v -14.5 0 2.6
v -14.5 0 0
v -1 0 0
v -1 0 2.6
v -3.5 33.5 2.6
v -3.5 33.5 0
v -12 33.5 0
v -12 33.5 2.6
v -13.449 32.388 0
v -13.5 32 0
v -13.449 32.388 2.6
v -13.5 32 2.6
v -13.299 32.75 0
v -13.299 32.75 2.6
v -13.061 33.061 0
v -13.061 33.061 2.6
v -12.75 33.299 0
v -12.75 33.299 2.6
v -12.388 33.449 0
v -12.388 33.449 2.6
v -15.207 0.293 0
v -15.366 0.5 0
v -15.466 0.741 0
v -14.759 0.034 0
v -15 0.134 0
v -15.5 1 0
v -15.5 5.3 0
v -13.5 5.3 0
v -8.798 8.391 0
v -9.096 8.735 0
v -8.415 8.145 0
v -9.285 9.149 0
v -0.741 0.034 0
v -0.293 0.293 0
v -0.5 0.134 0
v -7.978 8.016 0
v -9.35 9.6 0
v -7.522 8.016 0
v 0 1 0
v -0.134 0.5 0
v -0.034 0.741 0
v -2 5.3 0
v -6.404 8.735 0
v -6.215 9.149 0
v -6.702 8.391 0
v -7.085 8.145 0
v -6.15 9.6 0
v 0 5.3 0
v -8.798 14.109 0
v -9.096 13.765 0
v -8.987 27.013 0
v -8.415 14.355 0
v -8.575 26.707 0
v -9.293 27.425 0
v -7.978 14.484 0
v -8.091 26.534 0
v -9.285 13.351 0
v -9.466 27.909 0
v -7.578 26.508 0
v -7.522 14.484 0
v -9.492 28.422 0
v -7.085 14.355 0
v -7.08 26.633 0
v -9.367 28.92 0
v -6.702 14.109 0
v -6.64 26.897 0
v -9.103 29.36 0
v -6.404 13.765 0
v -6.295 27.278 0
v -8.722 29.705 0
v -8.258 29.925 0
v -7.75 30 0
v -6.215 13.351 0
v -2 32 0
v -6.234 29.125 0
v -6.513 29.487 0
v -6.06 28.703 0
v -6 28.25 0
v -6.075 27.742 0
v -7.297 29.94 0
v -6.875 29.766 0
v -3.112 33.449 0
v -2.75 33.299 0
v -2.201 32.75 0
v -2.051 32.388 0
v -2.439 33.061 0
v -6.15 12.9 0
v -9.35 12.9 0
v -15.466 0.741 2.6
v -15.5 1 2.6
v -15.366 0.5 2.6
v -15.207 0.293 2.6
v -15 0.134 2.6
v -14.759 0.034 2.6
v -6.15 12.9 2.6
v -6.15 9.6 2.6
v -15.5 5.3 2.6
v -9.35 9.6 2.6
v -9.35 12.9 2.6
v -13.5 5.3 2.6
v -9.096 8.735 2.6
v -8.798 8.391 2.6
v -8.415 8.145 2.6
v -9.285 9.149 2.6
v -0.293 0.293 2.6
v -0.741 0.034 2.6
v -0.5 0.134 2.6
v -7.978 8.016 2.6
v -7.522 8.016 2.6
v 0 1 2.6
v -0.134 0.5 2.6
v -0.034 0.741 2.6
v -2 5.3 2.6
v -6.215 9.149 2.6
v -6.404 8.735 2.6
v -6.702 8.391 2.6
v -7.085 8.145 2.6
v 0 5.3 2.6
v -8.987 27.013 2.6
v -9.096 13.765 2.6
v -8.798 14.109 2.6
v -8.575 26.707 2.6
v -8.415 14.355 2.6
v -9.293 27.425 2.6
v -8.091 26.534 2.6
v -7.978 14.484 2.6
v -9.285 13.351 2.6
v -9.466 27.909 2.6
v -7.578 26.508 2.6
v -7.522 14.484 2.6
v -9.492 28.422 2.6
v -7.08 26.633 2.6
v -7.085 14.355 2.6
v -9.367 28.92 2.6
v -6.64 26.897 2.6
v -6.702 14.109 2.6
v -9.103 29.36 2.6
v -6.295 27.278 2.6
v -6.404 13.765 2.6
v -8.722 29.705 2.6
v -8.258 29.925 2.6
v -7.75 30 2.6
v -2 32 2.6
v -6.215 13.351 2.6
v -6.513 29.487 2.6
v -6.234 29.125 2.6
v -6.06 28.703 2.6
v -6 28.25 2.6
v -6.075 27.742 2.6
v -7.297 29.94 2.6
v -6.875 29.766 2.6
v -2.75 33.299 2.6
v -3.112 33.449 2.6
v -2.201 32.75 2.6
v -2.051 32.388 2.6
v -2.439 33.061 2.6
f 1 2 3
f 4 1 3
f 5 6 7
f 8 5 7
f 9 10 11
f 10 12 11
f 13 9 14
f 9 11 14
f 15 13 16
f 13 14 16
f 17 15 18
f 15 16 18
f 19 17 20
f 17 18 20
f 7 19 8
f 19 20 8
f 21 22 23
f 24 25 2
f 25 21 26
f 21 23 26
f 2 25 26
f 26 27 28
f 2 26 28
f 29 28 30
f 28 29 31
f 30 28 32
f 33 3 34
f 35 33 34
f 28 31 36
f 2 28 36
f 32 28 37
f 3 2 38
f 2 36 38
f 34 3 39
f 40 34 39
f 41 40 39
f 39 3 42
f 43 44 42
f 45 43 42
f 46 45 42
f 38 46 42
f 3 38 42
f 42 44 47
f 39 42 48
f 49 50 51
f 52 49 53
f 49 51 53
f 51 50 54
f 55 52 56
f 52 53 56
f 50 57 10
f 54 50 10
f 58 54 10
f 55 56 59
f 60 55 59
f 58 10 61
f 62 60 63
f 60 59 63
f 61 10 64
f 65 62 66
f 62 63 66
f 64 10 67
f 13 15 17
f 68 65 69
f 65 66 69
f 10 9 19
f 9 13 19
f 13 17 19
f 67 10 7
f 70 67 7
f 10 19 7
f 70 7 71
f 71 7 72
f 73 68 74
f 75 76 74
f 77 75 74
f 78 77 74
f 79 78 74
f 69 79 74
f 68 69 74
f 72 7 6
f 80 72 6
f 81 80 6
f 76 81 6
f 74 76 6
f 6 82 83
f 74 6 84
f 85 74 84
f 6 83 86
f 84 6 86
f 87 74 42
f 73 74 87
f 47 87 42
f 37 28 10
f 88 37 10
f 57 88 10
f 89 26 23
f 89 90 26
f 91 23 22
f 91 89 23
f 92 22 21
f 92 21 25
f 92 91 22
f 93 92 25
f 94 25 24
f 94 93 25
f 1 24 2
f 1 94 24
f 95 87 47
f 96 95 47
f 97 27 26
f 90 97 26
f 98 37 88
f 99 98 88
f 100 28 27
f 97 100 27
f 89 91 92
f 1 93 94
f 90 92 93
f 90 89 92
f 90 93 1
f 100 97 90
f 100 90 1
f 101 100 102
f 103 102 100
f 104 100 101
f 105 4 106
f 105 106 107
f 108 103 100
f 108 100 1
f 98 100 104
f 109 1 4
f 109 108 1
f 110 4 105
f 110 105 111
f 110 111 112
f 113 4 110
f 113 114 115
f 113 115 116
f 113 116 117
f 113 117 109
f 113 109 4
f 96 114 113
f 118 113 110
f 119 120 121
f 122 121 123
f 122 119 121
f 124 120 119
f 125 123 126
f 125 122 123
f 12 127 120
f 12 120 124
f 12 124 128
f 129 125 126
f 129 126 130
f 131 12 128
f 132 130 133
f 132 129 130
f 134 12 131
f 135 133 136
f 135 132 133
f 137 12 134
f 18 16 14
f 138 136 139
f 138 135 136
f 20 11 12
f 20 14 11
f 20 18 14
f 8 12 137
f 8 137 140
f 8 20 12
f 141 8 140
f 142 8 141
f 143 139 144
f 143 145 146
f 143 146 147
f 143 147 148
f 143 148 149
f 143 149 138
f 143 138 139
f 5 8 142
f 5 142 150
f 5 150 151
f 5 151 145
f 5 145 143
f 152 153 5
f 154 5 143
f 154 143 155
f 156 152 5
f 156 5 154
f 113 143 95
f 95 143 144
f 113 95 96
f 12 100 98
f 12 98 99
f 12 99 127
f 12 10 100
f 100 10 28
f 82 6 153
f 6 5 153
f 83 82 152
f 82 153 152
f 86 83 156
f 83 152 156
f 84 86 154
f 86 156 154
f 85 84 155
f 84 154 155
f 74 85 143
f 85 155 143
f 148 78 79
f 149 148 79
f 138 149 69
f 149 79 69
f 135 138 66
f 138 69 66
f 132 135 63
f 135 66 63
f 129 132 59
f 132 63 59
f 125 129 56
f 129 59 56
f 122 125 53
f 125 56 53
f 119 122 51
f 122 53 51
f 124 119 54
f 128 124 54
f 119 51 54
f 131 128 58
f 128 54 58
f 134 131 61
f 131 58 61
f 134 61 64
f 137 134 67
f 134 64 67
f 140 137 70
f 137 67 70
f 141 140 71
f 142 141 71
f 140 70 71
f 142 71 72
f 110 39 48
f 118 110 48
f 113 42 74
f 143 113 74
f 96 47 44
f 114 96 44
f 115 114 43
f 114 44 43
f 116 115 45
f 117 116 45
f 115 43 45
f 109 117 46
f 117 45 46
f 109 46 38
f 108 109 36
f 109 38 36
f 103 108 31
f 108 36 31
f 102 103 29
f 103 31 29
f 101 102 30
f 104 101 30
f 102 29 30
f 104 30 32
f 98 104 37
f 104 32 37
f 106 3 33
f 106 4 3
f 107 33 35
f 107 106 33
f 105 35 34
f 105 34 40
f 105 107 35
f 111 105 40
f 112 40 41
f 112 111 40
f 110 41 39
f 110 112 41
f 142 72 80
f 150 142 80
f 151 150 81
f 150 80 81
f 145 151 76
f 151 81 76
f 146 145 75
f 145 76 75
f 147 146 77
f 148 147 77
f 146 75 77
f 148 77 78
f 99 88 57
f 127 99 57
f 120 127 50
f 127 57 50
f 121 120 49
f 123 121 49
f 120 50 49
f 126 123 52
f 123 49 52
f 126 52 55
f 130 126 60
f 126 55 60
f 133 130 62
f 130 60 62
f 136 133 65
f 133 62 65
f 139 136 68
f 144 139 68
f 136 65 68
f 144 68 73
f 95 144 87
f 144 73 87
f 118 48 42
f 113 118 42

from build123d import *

# Parameters (mm, degrees)
F1_DEPTH = 2.6
F2_R     = 1.5
F3_R     = 1


with BuildPart() as f1:
    # F0 (on Top) → F1 (new body)
    with BuildSketch(Plane.XY):
        with BuildLine():
            ThreePointArc((-6, 28.25), (-6.512563, 29.487437), (-7.75, 30))
            ThreePointArc((-7.75, 30), (-8.987437, 27.012563), (-6, 28.25))
        make_face()
        Polygon((-7.75, 33.5), (-13.5, 33.5), (-13.5, 5.3), (-15.5, 5.3), (-15.5, 0), (0, 0), (0, 5.3), (-2, 5.3), (-2, 33.5), align=None)
        with BuildLine():
            Line((-6.15, 12.9), (-6.15, 9.6))
            ThreePointArc((-6.15, 9.6), (-7.75, 8), (-9.35, 9.6))
            Line((-9.35, 9.6), (-9.35, 12.9))
            ThreePointArc((-9.35, 12.9), (-7.75, 14.5), (-6.15, 12.9))
        make_face(mode=Mode.SUBTRACT)
        with BuildLine():
            ThreePointArc((-6, 28.25), (-8.987437, 27.012563), (-7.75, 30))
            ThreePointArc((-7.75, 30), (-6.512563, 29.487437), (-6, 28.25))
        make_face(mode=Mode.SUBTRACT)
    extrude(amount=F1_DEPTH)

    # F2
    f2_edges = [f1.edges().sort_by_distance(p)[0] for p in [
        (-13.5, 33.5, 1.3),
        (-2, 33.5, 1.3),
    ]]
    fillet(f2_edges, radius=F2_R)

    # F3
    f3_edges = [f1.edges().sort_by_distance(p)[0] for p in [
        (0, 0, 1.3),
        (-15.5, 0, 1.3),
    ]]
    fillet(f3_edges, radius=F3_R)


solid = f1.part
